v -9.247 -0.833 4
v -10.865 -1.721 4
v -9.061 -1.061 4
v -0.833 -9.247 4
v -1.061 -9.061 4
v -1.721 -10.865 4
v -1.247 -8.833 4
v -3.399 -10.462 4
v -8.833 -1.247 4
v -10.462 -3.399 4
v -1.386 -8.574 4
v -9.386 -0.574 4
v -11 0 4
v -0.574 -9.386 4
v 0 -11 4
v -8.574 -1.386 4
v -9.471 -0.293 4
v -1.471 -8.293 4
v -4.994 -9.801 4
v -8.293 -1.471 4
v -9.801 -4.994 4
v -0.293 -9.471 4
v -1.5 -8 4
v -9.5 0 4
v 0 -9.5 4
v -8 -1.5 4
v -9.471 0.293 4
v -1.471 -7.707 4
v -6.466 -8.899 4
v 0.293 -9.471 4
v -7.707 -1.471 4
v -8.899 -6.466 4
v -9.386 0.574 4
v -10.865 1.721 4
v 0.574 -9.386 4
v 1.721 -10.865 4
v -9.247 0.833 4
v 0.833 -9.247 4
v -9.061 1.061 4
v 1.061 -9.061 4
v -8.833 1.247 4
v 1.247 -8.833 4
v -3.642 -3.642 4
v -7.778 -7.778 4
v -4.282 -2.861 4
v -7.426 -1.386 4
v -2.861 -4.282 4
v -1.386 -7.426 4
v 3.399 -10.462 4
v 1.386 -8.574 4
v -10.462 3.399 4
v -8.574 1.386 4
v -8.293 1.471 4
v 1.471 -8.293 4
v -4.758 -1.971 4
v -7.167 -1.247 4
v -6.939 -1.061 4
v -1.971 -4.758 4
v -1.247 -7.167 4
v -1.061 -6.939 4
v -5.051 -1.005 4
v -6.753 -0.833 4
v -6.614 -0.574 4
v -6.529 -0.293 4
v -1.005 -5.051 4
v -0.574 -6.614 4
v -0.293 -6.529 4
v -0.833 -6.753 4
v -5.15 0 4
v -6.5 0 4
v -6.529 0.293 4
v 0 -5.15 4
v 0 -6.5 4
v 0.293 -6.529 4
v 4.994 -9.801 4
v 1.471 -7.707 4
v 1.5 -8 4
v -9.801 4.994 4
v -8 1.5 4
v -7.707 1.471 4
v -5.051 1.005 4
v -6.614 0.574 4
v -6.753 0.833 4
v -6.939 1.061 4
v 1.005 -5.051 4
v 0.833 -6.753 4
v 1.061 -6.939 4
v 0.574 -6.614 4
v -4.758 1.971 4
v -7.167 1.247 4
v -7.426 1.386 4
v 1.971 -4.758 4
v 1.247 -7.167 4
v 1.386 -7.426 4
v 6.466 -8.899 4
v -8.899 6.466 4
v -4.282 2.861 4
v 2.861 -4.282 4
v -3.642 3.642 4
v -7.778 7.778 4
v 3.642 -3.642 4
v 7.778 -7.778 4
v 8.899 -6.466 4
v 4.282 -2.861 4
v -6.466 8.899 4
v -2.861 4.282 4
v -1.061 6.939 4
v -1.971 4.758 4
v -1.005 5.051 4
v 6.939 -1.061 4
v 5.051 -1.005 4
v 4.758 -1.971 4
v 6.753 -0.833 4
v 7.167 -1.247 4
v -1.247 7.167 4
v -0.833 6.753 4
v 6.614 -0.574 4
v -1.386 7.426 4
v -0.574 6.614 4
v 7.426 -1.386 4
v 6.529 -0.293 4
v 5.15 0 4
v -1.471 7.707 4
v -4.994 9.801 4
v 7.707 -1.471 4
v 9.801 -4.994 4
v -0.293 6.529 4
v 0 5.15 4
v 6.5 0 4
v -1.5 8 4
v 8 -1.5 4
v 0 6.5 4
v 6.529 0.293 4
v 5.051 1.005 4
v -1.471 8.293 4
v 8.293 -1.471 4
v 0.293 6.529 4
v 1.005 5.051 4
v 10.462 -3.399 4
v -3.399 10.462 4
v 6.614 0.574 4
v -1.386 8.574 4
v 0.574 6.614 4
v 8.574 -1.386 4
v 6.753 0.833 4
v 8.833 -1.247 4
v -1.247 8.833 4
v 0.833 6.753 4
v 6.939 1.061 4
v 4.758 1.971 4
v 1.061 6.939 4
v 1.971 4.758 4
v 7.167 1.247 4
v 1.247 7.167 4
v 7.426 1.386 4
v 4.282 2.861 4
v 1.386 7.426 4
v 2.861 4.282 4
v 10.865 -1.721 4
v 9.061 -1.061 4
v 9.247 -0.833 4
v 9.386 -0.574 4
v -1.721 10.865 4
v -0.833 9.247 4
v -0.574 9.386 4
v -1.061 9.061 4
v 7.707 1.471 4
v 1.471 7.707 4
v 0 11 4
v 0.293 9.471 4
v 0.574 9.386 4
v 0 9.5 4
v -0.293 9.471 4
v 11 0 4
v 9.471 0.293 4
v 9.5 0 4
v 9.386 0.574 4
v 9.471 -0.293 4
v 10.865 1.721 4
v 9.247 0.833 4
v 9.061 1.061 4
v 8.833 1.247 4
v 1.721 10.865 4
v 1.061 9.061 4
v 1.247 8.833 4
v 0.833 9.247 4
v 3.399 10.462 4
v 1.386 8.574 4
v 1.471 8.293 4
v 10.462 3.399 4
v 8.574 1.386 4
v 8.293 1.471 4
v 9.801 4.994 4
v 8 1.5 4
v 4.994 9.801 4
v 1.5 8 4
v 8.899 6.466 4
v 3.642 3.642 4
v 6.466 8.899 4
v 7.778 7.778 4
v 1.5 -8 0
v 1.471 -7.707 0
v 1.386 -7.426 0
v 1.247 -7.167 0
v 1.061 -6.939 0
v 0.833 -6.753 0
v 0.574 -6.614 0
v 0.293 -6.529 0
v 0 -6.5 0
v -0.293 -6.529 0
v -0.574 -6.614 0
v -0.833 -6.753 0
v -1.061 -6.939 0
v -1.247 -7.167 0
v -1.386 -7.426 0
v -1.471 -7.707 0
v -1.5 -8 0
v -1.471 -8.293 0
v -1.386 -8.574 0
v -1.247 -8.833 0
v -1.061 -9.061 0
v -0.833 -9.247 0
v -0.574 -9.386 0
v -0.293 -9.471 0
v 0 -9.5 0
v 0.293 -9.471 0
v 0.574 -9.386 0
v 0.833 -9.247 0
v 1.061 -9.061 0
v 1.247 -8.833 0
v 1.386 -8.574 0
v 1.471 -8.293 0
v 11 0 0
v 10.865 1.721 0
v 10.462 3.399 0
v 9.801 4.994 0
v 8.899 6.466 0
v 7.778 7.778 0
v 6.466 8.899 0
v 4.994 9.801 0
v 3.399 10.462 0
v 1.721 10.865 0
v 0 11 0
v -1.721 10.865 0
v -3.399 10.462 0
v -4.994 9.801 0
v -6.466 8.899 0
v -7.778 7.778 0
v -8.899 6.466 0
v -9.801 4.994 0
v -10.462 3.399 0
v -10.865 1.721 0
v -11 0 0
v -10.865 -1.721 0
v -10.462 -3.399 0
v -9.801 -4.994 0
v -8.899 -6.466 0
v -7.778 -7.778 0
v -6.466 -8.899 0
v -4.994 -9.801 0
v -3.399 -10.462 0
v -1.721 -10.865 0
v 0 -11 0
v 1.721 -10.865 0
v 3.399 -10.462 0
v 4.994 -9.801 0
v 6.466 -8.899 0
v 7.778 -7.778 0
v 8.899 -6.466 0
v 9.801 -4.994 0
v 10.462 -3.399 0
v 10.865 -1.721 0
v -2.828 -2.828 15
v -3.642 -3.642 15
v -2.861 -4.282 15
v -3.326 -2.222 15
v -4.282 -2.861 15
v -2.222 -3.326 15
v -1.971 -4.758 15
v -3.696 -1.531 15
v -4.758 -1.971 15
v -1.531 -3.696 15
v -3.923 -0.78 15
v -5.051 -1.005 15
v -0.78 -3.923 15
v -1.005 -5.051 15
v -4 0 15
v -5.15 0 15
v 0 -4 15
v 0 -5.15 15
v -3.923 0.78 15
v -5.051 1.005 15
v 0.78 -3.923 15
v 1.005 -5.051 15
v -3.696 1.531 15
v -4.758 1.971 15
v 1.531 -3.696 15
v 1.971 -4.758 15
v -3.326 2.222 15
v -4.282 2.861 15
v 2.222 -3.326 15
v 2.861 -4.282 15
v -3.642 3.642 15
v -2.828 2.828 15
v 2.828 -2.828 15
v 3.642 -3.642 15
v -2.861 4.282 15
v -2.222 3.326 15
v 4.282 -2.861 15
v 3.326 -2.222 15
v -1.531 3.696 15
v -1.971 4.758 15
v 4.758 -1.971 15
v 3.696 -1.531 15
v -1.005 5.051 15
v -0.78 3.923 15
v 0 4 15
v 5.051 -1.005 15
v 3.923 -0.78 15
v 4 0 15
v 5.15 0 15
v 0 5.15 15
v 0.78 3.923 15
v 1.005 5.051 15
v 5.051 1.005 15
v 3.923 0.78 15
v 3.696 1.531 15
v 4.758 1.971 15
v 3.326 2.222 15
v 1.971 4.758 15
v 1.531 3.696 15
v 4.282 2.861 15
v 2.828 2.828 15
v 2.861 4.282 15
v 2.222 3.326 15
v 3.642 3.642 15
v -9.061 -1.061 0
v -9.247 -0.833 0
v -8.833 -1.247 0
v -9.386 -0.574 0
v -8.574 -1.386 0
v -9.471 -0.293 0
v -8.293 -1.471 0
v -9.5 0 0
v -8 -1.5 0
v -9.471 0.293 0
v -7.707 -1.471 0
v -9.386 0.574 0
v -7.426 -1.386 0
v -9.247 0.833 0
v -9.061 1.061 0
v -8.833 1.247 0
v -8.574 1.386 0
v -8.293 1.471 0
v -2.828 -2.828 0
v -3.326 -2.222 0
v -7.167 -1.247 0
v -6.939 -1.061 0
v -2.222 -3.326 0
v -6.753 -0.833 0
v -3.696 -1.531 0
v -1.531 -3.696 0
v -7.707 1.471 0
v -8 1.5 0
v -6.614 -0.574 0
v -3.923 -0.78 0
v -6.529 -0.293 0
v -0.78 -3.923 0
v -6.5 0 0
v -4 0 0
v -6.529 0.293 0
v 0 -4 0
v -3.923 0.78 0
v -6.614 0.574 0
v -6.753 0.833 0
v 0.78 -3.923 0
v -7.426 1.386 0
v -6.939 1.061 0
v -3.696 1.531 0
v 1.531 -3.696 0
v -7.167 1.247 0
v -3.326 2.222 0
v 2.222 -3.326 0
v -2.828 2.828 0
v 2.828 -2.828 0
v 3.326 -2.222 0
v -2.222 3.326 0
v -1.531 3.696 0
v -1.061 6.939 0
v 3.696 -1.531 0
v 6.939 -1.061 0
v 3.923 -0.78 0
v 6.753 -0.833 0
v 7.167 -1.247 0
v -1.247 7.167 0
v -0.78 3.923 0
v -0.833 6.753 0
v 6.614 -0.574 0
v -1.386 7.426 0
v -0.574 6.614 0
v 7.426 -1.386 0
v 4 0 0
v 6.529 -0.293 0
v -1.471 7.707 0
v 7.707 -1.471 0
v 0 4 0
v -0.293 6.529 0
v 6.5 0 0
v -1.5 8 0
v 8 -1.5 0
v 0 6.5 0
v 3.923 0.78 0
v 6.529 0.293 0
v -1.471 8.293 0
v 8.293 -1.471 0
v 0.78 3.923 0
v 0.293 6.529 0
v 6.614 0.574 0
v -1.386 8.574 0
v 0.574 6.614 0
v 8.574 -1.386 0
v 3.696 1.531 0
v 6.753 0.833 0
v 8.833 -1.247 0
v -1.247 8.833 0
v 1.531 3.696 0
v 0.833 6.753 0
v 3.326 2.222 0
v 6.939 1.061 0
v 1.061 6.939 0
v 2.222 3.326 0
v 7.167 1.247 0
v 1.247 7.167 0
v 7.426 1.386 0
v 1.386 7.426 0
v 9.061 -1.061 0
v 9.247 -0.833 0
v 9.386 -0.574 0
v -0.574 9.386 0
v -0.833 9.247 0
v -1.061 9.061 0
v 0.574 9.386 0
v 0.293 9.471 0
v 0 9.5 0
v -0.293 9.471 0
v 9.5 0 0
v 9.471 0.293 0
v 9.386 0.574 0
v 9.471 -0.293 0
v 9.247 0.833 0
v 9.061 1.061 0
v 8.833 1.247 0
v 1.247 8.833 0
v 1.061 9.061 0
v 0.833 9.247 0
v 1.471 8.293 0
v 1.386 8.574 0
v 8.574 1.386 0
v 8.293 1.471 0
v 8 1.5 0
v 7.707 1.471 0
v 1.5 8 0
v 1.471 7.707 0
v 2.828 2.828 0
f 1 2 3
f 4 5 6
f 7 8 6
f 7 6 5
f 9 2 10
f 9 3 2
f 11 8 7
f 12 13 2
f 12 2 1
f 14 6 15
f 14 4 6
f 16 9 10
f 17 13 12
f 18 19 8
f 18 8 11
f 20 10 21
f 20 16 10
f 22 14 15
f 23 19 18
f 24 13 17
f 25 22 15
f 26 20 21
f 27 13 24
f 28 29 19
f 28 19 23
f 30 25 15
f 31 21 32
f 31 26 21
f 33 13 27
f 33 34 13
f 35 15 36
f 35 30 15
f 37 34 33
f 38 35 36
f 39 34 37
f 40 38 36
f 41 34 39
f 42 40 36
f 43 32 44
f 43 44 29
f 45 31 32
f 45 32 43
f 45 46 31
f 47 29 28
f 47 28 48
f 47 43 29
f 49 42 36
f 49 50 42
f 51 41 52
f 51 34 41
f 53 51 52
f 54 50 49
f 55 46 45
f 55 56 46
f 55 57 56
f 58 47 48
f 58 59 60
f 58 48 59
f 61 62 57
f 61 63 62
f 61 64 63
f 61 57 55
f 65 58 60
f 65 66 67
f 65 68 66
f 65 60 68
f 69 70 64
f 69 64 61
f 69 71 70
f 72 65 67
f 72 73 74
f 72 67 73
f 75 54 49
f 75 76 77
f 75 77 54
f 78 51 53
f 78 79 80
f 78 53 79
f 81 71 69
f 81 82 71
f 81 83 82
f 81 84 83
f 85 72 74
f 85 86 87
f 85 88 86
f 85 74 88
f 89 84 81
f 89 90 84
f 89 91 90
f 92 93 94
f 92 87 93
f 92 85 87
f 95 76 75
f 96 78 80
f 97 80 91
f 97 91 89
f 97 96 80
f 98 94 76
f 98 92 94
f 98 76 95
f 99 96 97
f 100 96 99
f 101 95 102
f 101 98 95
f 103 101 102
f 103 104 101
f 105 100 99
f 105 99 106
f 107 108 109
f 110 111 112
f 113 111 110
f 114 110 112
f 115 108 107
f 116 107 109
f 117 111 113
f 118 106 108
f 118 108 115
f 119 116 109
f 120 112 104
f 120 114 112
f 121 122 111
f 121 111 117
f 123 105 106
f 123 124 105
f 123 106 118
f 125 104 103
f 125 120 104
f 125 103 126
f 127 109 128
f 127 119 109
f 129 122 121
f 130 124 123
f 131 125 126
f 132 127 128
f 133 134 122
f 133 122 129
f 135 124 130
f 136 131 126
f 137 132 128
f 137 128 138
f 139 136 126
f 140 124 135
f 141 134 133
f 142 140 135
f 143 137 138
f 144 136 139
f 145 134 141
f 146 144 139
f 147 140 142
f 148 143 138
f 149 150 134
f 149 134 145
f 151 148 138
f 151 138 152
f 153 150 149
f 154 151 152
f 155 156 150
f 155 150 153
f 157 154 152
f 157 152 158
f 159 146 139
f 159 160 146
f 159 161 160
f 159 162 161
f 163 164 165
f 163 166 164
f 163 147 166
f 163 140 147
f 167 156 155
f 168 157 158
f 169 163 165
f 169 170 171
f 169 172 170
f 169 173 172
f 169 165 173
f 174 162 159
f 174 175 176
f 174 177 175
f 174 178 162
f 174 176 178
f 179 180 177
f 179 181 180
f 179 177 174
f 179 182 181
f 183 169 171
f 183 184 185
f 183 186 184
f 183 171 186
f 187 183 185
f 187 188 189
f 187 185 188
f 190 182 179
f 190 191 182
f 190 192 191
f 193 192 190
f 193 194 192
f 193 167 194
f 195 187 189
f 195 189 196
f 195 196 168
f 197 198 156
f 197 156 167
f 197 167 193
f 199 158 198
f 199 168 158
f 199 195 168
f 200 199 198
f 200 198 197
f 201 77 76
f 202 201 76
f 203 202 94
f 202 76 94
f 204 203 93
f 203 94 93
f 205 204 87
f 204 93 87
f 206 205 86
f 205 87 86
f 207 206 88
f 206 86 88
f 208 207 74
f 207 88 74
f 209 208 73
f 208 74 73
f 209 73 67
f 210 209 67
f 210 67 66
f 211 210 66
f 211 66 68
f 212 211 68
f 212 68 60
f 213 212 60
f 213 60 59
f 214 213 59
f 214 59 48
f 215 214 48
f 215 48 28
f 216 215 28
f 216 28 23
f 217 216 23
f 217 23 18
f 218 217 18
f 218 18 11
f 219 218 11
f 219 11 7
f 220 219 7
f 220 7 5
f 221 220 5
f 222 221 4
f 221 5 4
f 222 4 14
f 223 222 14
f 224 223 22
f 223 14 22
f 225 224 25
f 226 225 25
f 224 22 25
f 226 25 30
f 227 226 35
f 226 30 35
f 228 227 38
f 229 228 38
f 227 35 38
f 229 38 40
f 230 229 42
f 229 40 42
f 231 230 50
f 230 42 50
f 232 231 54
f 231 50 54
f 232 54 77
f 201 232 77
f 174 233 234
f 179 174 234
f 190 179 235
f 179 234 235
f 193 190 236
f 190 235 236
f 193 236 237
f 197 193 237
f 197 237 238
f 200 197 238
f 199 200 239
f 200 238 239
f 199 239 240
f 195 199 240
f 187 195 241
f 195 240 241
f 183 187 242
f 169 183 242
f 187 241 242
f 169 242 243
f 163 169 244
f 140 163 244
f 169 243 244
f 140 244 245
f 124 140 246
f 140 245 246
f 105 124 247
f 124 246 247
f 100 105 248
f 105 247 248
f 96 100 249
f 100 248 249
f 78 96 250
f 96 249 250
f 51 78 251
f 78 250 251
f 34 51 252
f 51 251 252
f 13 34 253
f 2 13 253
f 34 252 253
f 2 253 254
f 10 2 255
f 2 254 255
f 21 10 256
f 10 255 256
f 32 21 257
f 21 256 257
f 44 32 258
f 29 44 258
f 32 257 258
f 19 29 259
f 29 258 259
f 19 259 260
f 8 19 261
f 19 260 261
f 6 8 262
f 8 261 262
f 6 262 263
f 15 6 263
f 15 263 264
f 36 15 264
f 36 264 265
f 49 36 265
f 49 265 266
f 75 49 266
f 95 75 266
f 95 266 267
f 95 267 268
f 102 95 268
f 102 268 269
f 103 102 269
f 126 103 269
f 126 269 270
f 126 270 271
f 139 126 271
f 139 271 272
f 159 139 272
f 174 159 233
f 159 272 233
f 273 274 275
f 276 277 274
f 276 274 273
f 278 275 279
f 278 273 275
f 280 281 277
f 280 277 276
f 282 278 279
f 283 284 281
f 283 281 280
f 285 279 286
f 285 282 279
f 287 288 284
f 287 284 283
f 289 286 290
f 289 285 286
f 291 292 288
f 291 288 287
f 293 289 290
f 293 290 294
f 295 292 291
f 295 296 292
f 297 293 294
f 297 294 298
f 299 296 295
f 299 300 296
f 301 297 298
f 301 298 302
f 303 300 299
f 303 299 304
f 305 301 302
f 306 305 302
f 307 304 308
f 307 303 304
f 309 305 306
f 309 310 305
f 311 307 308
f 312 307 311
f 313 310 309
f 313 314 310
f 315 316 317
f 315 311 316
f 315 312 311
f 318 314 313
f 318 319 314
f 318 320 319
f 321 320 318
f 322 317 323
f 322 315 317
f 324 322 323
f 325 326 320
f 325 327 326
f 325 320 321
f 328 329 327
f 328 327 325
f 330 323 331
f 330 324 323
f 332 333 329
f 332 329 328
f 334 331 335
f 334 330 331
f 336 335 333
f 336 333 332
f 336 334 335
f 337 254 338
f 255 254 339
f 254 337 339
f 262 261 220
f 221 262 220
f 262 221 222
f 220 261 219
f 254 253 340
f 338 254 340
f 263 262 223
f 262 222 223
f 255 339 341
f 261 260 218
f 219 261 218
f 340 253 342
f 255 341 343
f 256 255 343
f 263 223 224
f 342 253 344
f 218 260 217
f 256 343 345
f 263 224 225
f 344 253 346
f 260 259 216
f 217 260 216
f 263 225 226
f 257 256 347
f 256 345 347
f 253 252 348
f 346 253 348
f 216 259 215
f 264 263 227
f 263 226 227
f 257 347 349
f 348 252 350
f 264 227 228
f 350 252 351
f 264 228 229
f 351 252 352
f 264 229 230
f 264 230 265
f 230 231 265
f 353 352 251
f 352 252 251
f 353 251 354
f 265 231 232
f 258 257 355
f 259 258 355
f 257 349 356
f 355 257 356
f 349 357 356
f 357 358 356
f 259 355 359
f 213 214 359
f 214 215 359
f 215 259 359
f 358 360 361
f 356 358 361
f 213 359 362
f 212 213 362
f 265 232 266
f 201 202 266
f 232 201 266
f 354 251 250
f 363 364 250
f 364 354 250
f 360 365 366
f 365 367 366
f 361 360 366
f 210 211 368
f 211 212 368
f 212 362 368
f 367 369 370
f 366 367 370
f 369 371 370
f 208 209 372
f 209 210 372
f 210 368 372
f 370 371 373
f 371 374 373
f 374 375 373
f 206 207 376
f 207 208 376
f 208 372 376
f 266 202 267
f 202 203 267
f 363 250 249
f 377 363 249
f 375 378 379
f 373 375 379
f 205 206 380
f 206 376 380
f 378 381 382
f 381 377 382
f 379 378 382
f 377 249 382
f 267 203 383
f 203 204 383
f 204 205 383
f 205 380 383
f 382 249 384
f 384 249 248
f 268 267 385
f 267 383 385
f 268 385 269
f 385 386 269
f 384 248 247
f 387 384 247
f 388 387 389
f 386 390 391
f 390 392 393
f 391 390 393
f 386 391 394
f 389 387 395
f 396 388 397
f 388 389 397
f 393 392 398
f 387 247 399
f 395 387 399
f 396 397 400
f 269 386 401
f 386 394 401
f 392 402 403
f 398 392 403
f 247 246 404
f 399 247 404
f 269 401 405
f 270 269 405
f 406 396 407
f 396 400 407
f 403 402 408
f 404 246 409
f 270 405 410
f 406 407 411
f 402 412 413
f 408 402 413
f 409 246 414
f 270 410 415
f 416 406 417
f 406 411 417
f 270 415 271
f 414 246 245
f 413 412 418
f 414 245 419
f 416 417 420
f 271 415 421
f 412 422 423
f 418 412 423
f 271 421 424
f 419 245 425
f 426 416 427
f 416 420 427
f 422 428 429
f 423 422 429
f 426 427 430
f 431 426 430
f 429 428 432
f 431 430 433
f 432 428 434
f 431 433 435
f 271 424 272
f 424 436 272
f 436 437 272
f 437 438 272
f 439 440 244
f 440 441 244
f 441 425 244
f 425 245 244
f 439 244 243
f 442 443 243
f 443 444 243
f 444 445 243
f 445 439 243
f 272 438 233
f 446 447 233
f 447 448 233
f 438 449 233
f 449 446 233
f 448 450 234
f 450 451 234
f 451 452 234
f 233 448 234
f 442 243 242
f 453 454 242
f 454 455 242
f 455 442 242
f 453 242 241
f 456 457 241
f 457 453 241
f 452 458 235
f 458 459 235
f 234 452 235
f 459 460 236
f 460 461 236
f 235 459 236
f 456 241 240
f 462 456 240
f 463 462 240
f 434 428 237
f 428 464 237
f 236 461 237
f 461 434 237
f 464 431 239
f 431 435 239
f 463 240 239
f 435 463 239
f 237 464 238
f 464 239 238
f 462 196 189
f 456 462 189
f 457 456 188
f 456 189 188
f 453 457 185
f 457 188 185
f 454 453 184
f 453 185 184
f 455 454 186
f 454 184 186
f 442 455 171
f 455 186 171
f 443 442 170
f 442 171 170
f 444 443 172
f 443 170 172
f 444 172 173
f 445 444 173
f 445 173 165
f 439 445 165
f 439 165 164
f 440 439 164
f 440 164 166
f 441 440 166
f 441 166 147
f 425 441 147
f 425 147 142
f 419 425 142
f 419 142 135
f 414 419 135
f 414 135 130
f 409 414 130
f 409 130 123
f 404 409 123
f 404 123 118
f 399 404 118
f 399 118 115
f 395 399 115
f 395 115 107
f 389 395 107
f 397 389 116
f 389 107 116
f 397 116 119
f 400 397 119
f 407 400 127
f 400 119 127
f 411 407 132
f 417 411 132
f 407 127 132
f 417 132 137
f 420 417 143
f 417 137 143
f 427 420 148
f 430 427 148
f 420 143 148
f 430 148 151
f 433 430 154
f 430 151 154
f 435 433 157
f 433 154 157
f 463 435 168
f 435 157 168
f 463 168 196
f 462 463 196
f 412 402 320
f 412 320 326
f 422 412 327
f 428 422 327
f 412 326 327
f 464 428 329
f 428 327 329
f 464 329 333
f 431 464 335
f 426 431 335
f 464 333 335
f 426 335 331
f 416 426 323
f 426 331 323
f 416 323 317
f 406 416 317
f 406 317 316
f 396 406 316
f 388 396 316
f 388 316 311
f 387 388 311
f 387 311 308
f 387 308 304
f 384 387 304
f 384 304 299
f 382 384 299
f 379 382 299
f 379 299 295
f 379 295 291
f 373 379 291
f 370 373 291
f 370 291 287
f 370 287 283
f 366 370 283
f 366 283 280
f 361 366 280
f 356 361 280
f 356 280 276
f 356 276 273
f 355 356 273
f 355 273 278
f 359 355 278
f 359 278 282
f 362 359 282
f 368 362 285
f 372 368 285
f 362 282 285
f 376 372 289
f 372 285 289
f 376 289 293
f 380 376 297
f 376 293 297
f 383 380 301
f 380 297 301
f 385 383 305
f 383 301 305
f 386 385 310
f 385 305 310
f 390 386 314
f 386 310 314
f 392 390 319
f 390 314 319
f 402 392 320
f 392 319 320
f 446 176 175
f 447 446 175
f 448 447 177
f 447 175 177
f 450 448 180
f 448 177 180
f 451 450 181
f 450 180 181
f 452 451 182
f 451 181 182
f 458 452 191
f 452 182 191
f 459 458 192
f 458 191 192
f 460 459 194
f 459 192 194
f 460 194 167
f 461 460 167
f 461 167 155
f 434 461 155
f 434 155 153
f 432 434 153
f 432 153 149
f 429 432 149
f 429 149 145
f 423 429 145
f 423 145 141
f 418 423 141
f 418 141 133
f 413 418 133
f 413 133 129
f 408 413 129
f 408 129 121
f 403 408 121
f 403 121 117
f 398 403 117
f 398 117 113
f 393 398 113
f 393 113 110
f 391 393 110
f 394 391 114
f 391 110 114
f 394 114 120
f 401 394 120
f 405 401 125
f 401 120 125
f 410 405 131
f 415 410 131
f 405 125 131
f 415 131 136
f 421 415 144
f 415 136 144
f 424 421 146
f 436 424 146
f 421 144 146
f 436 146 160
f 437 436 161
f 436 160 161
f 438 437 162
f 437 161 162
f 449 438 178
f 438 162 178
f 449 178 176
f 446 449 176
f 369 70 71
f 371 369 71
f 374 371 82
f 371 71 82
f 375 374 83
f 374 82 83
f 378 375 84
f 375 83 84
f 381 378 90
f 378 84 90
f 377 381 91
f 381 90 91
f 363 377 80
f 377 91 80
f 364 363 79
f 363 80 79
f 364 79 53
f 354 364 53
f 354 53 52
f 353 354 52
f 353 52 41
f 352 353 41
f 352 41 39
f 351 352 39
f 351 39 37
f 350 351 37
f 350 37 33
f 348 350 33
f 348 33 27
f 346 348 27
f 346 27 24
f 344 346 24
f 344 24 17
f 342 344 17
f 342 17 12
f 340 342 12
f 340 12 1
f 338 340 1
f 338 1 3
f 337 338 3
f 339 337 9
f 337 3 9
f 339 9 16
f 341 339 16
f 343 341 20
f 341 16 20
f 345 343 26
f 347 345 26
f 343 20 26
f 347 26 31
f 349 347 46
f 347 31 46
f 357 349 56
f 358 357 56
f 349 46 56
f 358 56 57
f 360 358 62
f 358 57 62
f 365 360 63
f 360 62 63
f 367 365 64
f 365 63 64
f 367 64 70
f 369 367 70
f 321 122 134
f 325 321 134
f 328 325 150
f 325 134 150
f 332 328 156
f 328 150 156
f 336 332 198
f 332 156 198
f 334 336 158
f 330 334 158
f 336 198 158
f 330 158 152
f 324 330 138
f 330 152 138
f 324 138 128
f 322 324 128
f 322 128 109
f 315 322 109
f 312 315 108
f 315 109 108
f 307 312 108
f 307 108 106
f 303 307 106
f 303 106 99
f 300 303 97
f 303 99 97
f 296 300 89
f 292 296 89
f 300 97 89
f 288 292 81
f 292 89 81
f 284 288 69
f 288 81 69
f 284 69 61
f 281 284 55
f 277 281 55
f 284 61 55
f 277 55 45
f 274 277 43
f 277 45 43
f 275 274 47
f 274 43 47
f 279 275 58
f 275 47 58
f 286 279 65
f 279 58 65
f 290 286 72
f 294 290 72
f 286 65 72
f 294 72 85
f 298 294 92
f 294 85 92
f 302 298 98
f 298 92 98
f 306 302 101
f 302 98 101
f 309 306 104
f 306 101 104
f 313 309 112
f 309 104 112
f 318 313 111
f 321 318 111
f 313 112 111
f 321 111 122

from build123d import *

# Parameters (mm, degrees)
SKETCH1_R           = 11
BOSS_EXTRUDE1_DEPTH = 4
SKETCH2_R           = 5.15
BOSS_EXTRUDE2_DEPTH = 11
SKETCH3_R           = 4
CUT_EXTRUDE1_DEPTH  = 16
SKETCH4_R           = 1.5
CUT_EXTRUDE2_DEPTH  = 5


with BuildPart() as part:
    # Sketch1 → Boss-Extrude1 (new body)
    with BuildSketch(Plane.XY):
        Circle(SKETCH1_R)
    extrude(amount=BOSS_EXTRUDE1_DEPTH)

    # Sketch2 → Boss-Extrude2 (add)
    with BuildSketch(Plane.XY.offset(4)):
        Circle(SKETCH2_R)
    extrude(amount=BOSS_EXTRUDE2_DEPTH)

    # Sketch3 → Cut-Extrude1 (cut, through all)
    with BuildSketch(Plane.XY.offset(15)):
        Circle(SKETCH3_R)
    extrude(amount=-CUT_EXTRUDE1_DEPTH, mode=Mode.SUBTRACT)

    # Sketch4 → Cut-Extrude2 (cut, through all)
    with BuildSketch(Plane.XY.offset(4)):
        with Locations((0, 8)):
            Circle(SKETCH4_R)
        with Locations((8, 0)):
            Circle(SKETCH4_R)
        with Locations((0, -8)):
            Circle(SKETCH4_R)
        with Locations((-8, 0)):
            Circle(SKETCH4_R)
    extrude(amount=-CUT_EXTRUDE2_DEPTH, mode=Mode.SUBTRACT)


solid = part.part
